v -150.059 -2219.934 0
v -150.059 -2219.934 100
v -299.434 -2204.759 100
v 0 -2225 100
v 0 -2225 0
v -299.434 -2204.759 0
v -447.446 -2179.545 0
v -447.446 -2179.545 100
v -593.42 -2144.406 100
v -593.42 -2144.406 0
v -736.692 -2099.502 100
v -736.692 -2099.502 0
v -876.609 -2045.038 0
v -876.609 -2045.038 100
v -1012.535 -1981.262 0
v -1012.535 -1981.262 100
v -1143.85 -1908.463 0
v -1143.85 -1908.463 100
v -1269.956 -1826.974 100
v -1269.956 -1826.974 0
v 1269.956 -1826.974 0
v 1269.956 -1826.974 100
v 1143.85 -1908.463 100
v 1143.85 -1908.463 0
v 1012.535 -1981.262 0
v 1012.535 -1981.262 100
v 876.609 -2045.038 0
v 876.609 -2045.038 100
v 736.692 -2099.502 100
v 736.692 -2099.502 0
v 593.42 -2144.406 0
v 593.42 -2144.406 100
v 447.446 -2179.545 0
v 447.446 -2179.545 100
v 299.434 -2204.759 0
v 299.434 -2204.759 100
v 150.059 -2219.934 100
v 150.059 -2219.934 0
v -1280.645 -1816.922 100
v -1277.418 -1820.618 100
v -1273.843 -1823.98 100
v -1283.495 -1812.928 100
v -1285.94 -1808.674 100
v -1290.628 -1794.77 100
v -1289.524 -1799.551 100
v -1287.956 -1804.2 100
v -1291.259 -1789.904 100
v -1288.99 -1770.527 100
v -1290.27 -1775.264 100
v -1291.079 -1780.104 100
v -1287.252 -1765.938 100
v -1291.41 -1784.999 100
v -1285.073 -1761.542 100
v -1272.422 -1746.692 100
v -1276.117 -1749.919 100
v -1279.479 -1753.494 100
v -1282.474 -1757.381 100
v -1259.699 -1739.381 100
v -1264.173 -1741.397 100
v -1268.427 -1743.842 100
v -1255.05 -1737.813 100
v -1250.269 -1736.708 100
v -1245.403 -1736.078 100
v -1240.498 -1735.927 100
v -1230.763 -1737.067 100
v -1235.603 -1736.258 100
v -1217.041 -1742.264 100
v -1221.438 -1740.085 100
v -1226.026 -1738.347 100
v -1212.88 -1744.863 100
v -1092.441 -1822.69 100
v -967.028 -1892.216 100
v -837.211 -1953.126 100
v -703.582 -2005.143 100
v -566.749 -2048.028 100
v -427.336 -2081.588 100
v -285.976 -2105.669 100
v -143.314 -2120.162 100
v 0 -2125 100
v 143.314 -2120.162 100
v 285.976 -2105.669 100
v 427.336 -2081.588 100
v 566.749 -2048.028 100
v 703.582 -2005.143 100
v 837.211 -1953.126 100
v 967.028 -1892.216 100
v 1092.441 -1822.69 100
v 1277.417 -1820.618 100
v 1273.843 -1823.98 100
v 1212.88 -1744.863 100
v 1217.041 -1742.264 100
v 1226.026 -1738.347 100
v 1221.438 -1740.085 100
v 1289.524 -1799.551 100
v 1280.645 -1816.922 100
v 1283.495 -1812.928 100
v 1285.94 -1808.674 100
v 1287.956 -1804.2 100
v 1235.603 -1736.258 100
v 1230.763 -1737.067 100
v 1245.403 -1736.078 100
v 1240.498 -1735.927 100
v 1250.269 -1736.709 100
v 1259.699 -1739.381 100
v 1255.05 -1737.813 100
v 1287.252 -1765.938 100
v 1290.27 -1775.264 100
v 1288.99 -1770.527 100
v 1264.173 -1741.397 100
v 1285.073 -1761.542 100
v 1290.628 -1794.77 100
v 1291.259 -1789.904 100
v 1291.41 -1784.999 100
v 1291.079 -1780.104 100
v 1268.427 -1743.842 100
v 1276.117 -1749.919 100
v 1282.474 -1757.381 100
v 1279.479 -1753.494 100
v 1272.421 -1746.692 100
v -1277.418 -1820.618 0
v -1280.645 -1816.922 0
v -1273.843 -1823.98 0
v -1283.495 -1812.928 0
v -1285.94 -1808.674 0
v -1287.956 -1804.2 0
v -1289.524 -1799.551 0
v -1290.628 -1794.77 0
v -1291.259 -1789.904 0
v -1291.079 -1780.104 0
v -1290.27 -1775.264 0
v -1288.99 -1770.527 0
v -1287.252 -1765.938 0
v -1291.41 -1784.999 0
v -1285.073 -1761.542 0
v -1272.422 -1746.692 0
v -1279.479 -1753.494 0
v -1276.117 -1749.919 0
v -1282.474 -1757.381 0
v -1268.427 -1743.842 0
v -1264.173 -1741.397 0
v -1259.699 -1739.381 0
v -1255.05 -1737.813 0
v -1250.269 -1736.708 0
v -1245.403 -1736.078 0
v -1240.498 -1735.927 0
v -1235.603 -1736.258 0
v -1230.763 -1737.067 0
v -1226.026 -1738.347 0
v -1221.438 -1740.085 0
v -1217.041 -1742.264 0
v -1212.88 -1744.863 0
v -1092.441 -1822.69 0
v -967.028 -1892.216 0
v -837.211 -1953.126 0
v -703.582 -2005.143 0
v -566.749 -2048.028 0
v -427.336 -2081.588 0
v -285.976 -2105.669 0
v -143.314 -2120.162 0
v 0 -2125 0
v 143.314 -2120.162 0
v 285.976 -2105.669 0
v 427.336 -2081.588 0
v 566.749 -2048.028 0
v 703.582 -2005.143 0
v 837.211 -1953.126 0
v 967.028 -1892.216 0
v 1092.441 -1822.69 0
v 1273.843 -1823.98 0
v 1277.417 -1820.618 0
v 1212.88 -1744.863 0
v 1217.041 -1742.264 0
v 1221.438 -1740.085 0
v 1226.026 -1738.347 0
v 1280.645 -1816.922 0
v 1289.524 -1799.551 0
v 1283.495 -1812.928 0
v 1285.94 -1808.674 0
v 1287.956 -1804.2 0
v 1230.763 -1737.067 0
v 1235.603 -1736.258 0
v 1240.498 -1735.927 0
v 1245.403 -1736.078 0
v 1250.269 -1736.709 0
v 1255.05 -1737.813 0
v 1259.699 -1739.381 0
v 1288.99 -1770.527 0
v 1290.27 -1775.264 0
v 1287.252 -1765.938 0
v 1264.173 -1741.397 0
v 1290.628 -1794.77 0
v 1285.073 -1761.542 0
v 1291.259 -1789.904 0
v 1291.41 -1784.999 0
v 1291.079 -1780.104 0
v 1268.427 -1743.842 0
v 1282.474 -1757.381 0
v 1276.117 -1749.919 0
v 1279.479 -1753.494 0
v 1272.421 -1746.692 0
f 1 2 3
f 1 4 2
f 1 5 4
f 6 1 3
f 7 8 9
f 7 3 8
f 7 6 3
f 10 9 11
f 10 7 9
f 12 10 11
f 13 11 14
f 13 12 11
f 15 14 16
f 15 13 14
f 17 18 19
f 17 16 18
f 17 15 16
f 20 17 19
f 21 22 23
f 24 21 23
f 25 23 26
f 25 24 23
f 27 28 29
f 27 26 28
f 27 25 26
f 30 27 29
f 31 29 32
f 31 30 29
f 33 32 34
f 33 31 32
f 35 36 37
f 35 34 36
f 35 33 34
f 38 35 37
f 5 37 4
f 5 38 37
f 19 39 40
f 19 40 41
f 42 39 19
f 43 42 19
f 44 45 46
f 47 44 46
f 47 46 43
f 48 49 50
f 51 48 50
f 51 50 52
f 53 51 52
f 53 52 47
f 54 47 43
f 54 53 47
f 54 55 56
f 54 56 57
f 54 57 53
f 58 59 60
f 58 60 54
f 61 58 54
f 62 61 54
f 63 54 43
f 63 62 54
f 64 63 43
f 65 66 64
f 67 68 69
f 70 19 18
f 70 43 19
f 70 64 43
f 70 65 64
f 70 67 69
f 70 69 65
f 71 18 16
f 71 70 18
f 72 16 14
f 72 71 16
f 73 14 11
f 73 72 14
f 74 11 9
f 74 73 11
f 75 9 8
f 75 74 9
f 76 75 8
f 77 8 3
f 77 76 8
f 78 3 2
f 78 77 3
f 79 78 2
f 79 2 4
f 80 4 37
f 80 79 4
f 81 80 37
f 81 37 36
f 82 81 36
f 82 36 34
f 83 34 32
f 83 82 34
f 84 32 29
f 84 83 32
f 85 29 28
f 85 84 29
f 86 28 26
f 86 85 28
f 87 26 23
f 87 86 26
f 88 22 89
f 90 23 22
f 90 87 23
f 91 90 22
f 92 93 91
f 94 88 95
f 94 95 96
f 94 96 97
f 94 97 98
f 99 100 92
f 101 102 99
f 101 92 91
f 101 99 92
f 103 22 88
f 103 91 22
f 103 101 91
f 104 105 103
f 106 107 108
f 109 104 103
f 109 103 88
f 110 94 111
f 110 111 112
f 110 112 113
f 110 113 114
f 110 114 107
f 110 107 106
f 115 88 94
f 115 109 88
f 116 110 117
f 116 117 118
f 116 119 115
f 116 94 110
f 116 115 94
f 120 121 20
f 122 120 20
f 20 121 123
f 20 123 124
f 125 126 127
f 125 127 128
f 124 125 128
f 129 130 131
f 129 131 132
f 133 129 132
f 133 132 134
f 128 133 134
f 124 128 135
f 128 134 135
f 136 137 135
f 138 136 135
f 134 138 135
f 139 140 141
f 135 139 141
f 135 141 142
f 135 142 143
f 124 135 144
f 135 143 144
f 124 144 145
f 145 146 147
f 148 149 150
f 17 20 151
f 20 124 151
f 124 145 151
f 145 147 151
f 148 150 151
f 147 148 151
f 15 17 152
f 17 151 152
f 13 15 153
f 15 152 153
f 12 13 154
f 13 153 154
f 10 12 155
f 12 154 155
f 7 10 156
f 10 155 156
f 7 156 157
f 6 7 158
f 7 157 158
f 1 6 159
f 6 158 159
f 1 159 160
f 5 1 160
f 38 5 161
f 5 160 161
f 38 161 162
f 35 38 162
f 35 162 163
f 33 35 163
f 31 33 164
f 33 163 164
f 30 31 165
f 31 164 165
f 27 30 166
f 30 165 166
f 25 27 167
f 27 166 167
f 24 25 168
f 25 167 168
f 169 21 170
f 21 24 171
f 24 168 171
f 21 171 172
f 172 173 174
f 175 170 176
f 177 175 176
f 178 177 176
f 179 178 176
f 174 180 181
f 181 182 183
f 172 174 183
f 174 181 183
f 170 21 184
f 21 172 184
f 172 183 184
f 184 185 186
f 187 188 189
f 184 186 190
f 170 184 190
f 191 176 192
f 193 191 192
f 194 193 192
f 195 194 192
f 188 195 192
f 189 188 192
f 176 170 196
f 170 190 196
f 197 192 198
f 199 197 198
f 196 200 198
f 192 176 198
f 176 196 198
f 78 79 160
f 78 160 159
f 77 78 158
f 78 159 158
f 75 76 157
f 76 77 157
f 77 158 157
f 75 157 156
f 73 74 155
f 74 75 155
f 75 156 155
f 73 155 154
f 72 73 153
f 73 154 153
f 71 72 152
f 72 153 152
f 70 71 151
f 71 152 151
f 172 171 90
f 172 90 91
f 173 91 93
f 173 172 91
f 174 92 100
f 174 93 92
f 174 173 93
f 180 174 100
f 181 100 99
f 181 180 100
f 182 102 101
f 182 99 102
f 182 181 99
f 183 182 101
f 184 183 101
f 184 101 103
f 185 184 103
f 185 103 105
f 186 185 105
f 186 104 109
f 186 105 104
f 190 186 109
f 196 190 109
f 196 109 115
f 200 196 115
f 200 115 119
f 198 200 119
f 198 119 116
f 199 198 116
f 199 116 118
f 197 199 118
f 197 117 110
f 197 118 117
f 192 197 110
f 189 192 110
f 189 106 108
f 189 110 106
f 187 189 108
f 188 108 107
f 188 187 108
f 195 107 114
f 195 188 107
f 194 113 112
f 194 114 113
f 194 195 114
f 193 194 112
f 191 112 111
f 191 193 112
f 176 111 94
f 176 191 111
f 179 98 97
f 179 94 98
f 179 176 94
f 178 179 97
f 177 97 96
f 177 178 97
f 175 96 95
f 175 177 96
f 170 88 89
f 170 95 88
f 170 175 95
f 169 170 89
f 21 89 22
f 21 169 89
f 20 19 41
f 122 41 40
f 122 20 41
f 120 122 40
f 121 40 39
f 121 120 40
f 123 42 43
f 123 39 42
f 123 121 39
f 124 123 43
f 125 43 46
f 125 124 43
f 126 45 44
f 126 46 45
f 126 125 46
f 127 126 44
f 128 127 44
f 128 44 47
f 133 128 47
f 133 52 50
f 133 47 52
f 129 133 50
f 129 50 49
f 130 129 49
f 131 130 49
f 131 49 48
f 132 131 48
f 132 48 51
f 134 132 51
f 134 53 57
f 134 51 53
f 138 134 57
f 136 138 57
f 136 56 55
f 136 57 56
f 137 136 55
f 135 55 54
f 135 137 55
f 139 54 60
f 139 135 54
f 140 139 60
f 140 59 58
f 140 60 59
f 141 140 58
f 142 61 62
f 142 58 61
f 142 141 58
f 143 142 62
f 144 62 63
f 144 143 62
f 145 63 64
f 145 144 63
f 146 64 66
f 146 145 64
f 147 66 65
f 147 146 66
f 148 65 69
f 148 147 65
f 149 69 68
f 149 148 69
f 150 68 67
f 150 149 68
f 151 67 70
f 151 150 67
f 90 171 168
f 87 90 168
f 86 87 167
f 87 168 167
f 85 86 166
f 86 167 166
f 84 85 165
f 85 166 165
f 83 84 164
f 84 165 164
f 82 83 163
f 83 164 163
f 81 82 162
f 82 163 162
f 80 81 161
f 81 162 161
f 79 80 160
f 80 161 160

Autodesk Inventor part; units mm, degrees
ref_plane "YZ Plane" through (0, 0, 0) normal (1, 0, 0) x (0, 1, 0)
ref_plane "XZ Plane" through (0, 0, 0) normal (0, 1, 0) x (-1, 0, 0)
ref_plane "XY Plane" through (0, 0, 0) normal (0, 0, 1) x (1, 0, 0)
sketch "Sketch1" plane through (0, 0, 0) normal (0, 0, 1) x (1, 0, 0)
  arc A0 (0, -2125) -> (1212.8796, -1744.8633) centre (0, 0) ccw
  arc A1 (0, -2225) -> (1269.9563, -1826.9745) centre (0, 0) ccw
  line L0 (0, -2125) -> (0, -1744.8633)
  arc A2 (1269.9563, -1826.9745) -> (1212.8796, -1744.8633) centre (1241.418, -1785.9189) ccw
  line L1 (0, -2225) -> (0, -2125)
  arc A3 (-1212.8796, -1744.8633) -> (0, -2125) centre (0, 0) ccw
  arc A4 (-1269.9563, -1826.9745) -> (0, -2225) centre (0, 0) ccw
  arc A5 (-1212.8796, -1744.8633) -> (-1269.9563, -1826.9745) centre (-1241.418, -1785.9189) ccw
  dimension "d0" = 4250
  dimension "d1" = 4450
extrude "Extrusion1" add sketch "Sketch1" along normal blind 100
properties part number "Saddle"
